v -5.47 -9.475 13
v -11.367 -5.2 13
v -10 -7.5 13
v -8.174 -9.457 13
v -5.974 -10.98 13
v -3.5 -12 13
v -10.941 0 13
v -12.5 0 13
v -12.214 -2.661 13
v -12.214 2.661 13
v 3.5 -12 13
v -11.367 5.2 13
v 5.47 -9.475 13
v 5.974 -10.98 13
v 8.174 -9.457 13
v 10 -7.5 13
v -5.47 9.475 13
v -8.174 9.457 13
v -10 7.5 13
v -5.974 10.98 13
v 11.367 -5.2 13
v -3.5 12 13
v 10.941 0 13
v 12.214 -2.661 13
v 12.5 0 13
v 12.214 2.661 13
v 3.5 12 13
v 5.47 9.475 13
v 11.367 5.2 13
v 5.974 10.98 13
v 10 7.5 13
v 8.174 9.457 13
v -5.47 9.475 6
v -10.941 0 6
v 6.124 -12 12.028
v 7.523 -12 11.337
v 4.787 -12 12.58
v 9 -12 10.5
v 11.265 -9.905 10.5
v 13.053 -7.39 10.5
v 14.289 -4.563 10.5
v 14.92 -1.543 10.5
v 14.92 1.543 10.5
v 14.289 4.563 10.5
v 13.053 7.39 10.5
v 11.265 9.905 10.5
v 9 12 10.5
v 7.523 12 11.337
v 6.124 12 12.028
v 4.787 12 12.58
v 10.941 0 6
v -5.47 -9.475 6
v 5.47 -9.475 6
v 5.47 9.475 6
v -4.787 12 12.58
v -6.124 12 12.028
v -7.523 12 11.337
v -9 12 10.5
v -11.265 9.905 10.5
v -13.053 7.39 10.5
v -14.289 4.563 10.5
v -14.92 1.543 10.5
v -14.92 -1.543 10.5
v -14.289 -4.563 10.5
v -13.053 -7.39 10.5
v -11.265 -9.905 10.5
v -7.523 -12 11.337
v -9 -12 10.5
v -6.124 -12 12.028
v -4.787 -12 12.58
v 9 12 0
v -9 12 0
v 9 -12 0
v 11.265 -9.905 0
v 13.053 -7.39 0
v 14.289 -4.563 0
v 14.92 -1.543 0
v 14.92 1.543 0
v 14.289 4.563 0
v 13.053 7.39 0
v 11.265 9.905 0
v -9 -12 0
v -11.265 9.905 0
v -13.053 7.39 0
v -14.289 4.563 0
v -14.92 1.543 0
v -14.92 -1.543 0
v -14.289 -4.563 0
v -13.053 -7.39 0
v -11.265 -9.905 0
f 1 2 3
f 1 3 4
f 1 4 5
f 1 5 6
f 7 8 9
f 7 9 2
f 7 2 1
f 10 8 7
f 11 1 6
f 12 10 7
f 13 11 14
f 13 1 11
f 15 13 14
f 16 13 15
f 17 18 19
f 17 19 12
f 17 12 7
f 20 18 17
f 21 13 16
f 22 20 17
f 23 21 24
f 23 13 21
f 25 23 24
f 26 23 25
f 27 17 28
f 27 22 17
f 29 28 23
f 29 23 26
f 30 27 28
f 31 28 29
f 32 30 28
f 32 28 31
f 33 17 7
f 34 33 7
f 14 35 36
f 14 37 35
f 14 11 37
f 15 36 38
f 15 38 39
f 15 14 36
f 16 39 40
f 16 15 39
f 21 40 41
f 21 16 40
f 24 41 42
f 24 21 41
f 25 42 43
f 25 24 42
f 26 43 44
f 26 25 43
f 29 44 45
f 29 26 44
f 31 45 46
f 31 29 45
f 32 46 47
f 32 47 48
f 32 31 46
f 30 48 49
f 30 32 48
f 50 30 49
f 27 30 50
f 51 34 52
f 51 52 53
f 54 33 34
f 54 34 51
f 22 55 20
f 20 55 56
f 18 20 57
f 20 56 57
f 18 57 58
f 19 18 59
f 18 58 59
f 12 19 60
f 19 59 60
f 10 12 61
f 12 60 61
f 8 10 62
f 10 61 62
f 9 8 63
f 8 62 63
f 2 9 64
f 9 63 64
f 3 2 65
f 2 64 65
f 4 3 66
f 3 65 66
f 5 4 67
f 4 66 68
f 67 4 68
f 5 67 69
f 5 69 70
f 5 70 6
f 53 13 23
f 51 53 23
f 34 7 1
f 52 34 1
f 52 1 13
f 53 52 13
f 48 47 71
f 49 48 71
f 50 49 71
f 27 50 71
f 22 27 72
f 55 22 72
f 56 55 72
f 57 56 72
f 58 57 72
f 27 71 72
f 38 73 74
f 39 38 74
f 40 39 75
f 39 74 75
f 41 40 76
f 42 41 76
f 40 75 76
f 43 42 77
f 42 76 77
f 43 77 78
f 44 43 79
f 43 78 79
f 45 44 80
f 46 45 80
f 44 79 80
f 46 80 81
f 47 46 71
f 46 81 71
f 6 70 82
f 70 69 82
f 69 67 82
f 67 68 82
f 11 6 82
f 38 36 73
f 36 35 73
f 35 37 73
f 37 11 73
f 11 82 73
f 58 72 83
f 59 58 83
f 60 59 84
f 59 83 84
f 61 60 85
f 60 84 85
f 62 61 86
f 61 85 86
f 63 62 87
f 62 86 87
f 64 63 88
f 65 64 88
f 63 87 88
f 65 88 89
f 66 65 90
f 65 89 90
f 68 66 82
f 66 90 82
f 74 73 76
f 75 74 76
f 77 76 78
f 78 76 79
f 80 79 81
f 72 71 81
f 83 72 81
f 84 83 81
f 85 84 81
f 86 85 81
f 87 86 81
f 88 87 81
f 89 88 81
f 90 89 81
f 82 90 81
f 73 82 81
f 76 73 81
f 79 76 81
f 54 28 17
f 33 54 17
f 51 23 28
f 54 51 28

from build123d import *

# Parameters (mm, degrees)
F1_DEPTH = 13
F3_DEPTH = 7
F4_SIZE  = 2.5
F5_DEPTH = 2


# Not quite as in the source:
# - a feature names something its author has since deleted; it is built from what else it names


with BuildPart() as f1:
    # F0 (on Top) → F1 (new body)
    with BuildSketch(Plane.XY):
        with BuildLine():
            ThreePointArc((9, -12), (13.416407865, -6.7082039325), (15, 0))
            ThreePointArc((15, 0), (13.416407865, 6.7082039325), (9, 12))
            Line((9, 12), (-9, 12))
            ThreePointArc((-9, 12), (-15, 0), (-9, -12))
            Line((-9, -12), (9, -12))
        make_face()
    extrude(amount=F1_DEPTH)

    # F2 (on face) → F3 (cut)
    with BuildSketch(Plane.XY.offset(13)):
        Polygon((5.4703938006, -9.475), (10.9407876011, 0), (5.4703938006, 9.475), (-5.4703938006, 9.475), (-10.9407876011, 0), (-5.4703938006, -9.475), align=None)
    extrude(amount=-F3_DEPTH, mode=Mode.SUBTRACT)

    # F4
    f4_edges = [f1.edges().sort_by_distance(p)[0] for p in [
        (15, 0, 13),
        (-15, 0, 13),
    ]]
    chamfer(f4_edges, length=F4_SIZE)

    # F0 (on Top) → F5 (join)
    with BuildSketch(Plane.XY):
        with BuildLine():
            ThreePointArc((9, -12), (13.416407865, -6.7082039325), (15, 0))
            ThreePointArc((15, 0), (13.416407865, 6.7082039325), (9, 12))
            Line((9, 12), (-9, 12))
            ThreePointArc((-9, 12), (-15, 0), (-9, -12))
            Line((-9, -12), (9, -12))
        make_face()
    extrude(amount=F5_DEPTH)


solid = f1.part
